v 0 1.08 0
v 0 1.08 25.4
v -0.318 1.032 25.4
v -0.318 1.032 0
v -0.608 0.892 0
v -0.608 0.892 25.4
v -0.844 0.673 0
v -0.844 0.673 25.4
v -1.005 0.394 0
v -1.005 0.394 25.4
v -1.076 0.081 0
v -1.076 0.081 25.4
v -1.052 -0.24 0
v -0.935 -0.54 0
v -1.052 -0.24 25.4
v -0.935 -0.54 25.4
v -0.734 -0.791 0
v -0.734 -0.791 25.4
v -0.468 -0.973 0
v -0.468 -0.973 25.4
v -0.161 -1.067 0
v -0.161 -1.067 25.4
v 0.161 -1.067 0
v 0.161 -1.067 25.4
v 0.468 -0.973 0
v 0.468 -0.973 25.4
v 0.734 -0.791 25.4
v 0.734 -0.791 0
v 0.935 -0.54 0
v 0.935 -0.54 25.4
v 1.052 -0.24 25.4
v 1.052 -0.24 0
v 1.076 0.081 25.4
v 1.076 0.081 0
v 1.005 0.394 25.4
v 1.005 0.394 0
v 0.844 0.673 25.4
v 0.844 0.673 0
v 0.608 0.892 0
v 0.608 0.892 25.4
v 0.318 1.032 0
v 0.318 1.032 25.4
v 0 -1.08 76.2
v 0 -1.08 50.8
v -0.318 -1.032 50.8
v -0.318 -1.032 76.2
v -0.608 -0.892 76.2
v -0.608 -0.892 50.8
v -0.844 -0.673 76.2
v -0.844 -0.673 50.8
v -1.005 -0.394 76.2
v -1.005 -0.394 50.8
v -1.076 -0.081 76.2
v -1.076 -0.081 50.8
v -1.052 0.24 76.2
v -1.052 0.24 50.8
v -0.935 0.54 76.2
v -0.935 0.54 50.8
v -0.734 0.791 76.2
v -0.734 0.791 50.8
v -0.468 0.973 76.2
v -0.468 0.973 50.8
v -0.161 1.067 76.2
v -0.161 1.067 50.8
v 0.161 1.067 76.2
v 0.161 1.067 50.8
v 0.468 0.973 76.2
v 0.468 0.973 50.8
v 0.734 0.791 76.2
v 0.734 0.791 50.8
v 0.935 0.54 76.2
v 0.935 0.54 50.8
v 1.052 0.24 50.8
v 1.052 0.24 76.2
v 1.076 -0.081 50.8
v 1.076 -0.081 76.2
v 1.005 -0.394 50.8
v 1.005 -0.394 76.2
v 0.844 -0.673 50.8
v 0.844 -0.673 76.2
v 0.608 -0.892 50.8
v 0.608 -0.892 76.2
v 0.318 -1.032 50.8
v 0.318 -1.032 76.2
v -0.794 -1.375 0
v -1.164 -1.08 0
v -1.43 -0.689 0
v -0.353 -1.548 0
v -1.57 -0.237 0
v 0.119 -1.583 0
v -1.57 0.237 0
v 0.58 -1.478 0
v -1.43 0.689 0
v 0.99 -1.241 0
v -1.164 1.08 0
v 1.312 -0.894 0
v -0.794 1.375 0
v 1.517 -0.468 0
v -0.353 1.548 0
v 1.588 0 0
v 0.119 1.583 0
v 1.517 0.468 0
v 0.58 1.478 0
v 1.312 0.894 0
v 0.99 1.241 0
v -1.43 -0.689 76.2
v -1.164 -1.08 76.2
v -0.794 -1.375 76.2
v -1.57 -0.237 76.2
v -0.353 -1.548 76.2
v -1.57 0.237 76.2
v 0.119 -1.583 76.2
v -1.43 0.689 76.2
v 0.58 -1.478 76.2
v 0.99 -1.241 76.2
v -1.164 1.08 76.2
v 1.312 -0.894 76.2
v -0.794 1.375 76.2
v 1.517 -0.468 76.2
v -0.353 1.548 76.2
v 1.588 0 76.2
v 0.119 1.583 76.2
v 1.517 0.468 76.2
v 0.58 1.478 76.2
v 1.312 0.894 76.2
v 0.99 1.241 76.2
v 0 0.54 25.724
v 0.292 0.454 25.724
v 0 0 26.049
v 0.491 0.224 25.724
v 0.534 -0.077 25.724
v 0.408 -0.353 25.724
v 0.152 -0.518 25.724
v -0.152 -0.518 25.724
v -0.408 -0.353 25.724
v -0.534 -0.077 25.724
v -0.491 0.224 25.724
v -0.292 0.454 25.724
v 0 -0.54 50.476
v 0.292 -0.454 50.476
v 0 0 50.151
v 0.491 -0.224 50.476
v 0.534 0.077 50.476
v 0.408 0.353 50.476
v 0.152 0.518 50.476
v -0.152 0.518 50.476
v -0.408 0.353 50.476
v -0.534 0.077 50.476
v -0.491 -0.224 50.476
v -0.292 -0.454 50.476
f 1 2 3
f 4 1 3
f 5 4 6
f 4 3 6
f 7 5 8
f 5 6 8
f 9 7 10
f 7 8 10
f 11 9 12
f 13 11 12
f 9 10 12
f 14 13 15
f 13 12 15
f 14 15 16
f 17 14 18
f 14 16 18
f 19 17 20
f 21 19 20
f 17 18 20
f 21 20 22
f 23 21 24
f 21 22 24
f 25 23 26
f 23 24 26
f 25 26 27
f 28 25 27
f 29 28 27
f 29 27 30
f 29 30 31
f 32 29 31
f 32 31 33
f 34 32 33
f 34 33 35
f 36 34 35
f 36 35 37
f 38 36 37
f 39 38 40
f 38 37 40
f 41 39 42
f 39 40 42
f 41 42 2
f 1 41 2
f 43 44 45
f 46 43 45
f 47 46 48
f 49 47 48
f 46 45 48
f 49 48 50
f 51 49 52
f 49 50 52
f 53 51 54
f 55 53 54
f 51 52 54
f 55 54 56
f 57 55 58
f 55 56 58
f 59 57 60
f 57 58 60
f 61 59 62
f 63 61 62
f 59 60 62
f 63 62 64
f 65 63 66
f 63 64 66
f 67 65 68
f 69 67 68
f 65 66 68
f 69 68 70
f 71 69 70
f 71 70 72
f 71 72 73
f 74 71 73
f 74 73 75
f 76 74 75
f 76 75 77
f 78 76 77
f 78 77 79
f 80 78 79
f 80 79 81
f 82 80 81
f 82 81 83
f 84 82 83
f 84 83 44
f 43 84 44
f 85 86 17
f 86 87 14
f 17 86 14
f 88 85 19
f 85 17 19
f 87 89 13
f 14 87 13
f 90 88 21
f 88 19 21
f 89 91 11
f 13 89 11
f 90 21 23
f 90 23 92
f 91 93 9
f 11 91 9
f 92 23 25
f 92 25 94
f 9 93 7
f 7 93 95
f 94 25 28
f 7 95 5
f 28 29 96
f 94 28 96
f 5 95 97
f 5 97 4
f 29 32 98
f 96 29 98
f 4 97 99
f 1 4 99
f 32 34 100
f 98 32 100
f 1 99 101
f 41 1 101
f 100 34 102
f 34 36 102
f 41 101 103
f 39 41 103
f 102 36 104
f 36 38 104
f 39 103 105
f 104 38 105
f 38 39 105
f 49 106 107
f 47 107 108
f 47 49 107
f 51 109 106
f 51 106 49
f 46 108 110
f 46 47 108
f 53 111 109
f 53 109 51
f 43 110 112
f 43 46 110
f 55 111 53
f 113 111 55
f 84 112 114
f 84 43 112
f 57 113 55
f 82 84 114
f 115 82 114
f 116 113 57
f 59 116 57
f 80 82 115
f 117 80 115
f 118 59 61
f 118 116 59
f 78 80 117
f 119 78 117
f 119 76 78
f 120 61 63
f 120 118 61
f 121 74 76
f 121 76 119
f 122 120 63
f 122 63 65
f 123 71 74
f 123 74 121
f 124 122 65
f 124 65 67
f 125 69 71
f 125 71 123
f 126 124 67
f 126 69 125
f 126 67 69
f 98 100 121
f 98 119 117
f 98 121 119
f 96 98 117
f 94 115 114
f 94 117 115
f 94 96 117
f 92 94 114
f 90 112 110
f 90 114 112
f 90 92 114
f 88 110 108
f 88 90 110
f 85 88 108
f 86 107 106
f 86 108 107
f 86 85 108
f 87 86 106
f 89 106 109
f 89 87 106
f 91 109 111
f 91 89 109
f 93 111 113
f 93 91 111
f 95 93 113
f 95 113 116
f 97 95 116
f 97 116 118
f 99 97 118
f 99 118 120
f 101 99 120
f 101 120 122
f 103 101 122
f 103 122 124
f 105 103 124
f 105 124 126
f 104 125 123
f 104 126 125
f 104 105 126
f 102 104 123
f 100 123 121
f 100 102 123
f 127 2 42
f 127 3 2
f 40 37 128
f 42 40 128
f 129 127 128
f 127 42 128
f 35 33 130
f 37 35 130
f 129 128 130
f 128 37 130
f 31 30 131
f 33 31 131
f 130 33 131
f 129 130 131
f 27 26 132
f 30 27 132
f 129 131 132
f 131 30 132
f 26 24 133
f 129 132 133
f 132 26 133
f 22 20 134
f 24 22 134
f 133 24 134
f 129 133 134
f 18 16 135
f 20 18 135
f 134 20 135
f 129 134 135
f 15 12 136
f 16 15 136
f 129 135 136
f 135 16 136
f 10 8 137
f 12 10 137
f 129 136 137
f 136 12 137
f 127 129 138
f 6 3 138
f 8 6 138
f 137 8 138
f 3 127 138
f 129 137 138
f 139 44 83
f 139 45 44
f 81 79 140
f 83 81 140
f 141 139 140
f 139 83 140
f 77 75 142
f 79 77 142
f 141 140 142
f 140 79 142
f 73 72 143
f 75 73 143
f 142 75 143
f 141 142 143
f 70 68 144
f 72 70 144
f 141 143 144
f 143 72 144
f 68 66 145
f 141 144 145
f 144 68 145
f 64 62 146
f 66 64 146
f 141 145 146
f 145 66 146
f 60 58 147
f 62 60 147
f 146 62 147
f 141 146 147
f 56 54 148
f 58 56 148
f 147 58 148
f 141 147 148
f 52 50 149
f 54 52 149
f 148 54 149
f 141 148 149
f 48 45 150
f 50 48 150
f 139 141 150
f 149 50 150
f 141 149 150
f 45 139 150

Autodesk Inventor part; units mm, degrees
ref_plane "YZ Plane" through (0, 0, 0) normal (1, 0, 0) x (0, 1, 0)
ref_plane "XZ Plane" through (0, 0, 0) normal (0, 1, 0) x (-1, 0, 0)
ref_plane "XY Plane" through (0, 0, 0) normal (0, 0, 1) x (1, 0, 0)
sketch "Sketch1" plane through (0, 0, 0) normal (0, 0, 1) x (1, 0, 0)
  circle A0 centre (0, 0) radius 1.5875
  dimension "d0" = 3.175
extrude "Extrusion1" add sketch "Sketch1" along normal blind 76.2
sketch "Sketch2" plane through (0, 0, 76.2) normal (0, 0, 1) x (1, 0, 0)
  circle A0 centre (0, 0) radius 1.5875 projected
  circle A1 centre (0, 0) radius 1.1303
  dimension "d3" = 2.2606
hole "Hole1" at (0, 0, 76.2) direction (0, 0, -1) diameter 2.159 depth 25.4 tip angle 118
sketch "Sketch3" plane through (0, 0, 0) normal (0, 0, -1) x (-1, 0, 0)
  circle A0 centre (0, 0) radius 1.5875 projected
hole "Hole2" at (0, 0, 0) direction (0, 0, 1) diameter 2.159 depth 25.4 tip angle 118
properties part number "Steel Rod"
